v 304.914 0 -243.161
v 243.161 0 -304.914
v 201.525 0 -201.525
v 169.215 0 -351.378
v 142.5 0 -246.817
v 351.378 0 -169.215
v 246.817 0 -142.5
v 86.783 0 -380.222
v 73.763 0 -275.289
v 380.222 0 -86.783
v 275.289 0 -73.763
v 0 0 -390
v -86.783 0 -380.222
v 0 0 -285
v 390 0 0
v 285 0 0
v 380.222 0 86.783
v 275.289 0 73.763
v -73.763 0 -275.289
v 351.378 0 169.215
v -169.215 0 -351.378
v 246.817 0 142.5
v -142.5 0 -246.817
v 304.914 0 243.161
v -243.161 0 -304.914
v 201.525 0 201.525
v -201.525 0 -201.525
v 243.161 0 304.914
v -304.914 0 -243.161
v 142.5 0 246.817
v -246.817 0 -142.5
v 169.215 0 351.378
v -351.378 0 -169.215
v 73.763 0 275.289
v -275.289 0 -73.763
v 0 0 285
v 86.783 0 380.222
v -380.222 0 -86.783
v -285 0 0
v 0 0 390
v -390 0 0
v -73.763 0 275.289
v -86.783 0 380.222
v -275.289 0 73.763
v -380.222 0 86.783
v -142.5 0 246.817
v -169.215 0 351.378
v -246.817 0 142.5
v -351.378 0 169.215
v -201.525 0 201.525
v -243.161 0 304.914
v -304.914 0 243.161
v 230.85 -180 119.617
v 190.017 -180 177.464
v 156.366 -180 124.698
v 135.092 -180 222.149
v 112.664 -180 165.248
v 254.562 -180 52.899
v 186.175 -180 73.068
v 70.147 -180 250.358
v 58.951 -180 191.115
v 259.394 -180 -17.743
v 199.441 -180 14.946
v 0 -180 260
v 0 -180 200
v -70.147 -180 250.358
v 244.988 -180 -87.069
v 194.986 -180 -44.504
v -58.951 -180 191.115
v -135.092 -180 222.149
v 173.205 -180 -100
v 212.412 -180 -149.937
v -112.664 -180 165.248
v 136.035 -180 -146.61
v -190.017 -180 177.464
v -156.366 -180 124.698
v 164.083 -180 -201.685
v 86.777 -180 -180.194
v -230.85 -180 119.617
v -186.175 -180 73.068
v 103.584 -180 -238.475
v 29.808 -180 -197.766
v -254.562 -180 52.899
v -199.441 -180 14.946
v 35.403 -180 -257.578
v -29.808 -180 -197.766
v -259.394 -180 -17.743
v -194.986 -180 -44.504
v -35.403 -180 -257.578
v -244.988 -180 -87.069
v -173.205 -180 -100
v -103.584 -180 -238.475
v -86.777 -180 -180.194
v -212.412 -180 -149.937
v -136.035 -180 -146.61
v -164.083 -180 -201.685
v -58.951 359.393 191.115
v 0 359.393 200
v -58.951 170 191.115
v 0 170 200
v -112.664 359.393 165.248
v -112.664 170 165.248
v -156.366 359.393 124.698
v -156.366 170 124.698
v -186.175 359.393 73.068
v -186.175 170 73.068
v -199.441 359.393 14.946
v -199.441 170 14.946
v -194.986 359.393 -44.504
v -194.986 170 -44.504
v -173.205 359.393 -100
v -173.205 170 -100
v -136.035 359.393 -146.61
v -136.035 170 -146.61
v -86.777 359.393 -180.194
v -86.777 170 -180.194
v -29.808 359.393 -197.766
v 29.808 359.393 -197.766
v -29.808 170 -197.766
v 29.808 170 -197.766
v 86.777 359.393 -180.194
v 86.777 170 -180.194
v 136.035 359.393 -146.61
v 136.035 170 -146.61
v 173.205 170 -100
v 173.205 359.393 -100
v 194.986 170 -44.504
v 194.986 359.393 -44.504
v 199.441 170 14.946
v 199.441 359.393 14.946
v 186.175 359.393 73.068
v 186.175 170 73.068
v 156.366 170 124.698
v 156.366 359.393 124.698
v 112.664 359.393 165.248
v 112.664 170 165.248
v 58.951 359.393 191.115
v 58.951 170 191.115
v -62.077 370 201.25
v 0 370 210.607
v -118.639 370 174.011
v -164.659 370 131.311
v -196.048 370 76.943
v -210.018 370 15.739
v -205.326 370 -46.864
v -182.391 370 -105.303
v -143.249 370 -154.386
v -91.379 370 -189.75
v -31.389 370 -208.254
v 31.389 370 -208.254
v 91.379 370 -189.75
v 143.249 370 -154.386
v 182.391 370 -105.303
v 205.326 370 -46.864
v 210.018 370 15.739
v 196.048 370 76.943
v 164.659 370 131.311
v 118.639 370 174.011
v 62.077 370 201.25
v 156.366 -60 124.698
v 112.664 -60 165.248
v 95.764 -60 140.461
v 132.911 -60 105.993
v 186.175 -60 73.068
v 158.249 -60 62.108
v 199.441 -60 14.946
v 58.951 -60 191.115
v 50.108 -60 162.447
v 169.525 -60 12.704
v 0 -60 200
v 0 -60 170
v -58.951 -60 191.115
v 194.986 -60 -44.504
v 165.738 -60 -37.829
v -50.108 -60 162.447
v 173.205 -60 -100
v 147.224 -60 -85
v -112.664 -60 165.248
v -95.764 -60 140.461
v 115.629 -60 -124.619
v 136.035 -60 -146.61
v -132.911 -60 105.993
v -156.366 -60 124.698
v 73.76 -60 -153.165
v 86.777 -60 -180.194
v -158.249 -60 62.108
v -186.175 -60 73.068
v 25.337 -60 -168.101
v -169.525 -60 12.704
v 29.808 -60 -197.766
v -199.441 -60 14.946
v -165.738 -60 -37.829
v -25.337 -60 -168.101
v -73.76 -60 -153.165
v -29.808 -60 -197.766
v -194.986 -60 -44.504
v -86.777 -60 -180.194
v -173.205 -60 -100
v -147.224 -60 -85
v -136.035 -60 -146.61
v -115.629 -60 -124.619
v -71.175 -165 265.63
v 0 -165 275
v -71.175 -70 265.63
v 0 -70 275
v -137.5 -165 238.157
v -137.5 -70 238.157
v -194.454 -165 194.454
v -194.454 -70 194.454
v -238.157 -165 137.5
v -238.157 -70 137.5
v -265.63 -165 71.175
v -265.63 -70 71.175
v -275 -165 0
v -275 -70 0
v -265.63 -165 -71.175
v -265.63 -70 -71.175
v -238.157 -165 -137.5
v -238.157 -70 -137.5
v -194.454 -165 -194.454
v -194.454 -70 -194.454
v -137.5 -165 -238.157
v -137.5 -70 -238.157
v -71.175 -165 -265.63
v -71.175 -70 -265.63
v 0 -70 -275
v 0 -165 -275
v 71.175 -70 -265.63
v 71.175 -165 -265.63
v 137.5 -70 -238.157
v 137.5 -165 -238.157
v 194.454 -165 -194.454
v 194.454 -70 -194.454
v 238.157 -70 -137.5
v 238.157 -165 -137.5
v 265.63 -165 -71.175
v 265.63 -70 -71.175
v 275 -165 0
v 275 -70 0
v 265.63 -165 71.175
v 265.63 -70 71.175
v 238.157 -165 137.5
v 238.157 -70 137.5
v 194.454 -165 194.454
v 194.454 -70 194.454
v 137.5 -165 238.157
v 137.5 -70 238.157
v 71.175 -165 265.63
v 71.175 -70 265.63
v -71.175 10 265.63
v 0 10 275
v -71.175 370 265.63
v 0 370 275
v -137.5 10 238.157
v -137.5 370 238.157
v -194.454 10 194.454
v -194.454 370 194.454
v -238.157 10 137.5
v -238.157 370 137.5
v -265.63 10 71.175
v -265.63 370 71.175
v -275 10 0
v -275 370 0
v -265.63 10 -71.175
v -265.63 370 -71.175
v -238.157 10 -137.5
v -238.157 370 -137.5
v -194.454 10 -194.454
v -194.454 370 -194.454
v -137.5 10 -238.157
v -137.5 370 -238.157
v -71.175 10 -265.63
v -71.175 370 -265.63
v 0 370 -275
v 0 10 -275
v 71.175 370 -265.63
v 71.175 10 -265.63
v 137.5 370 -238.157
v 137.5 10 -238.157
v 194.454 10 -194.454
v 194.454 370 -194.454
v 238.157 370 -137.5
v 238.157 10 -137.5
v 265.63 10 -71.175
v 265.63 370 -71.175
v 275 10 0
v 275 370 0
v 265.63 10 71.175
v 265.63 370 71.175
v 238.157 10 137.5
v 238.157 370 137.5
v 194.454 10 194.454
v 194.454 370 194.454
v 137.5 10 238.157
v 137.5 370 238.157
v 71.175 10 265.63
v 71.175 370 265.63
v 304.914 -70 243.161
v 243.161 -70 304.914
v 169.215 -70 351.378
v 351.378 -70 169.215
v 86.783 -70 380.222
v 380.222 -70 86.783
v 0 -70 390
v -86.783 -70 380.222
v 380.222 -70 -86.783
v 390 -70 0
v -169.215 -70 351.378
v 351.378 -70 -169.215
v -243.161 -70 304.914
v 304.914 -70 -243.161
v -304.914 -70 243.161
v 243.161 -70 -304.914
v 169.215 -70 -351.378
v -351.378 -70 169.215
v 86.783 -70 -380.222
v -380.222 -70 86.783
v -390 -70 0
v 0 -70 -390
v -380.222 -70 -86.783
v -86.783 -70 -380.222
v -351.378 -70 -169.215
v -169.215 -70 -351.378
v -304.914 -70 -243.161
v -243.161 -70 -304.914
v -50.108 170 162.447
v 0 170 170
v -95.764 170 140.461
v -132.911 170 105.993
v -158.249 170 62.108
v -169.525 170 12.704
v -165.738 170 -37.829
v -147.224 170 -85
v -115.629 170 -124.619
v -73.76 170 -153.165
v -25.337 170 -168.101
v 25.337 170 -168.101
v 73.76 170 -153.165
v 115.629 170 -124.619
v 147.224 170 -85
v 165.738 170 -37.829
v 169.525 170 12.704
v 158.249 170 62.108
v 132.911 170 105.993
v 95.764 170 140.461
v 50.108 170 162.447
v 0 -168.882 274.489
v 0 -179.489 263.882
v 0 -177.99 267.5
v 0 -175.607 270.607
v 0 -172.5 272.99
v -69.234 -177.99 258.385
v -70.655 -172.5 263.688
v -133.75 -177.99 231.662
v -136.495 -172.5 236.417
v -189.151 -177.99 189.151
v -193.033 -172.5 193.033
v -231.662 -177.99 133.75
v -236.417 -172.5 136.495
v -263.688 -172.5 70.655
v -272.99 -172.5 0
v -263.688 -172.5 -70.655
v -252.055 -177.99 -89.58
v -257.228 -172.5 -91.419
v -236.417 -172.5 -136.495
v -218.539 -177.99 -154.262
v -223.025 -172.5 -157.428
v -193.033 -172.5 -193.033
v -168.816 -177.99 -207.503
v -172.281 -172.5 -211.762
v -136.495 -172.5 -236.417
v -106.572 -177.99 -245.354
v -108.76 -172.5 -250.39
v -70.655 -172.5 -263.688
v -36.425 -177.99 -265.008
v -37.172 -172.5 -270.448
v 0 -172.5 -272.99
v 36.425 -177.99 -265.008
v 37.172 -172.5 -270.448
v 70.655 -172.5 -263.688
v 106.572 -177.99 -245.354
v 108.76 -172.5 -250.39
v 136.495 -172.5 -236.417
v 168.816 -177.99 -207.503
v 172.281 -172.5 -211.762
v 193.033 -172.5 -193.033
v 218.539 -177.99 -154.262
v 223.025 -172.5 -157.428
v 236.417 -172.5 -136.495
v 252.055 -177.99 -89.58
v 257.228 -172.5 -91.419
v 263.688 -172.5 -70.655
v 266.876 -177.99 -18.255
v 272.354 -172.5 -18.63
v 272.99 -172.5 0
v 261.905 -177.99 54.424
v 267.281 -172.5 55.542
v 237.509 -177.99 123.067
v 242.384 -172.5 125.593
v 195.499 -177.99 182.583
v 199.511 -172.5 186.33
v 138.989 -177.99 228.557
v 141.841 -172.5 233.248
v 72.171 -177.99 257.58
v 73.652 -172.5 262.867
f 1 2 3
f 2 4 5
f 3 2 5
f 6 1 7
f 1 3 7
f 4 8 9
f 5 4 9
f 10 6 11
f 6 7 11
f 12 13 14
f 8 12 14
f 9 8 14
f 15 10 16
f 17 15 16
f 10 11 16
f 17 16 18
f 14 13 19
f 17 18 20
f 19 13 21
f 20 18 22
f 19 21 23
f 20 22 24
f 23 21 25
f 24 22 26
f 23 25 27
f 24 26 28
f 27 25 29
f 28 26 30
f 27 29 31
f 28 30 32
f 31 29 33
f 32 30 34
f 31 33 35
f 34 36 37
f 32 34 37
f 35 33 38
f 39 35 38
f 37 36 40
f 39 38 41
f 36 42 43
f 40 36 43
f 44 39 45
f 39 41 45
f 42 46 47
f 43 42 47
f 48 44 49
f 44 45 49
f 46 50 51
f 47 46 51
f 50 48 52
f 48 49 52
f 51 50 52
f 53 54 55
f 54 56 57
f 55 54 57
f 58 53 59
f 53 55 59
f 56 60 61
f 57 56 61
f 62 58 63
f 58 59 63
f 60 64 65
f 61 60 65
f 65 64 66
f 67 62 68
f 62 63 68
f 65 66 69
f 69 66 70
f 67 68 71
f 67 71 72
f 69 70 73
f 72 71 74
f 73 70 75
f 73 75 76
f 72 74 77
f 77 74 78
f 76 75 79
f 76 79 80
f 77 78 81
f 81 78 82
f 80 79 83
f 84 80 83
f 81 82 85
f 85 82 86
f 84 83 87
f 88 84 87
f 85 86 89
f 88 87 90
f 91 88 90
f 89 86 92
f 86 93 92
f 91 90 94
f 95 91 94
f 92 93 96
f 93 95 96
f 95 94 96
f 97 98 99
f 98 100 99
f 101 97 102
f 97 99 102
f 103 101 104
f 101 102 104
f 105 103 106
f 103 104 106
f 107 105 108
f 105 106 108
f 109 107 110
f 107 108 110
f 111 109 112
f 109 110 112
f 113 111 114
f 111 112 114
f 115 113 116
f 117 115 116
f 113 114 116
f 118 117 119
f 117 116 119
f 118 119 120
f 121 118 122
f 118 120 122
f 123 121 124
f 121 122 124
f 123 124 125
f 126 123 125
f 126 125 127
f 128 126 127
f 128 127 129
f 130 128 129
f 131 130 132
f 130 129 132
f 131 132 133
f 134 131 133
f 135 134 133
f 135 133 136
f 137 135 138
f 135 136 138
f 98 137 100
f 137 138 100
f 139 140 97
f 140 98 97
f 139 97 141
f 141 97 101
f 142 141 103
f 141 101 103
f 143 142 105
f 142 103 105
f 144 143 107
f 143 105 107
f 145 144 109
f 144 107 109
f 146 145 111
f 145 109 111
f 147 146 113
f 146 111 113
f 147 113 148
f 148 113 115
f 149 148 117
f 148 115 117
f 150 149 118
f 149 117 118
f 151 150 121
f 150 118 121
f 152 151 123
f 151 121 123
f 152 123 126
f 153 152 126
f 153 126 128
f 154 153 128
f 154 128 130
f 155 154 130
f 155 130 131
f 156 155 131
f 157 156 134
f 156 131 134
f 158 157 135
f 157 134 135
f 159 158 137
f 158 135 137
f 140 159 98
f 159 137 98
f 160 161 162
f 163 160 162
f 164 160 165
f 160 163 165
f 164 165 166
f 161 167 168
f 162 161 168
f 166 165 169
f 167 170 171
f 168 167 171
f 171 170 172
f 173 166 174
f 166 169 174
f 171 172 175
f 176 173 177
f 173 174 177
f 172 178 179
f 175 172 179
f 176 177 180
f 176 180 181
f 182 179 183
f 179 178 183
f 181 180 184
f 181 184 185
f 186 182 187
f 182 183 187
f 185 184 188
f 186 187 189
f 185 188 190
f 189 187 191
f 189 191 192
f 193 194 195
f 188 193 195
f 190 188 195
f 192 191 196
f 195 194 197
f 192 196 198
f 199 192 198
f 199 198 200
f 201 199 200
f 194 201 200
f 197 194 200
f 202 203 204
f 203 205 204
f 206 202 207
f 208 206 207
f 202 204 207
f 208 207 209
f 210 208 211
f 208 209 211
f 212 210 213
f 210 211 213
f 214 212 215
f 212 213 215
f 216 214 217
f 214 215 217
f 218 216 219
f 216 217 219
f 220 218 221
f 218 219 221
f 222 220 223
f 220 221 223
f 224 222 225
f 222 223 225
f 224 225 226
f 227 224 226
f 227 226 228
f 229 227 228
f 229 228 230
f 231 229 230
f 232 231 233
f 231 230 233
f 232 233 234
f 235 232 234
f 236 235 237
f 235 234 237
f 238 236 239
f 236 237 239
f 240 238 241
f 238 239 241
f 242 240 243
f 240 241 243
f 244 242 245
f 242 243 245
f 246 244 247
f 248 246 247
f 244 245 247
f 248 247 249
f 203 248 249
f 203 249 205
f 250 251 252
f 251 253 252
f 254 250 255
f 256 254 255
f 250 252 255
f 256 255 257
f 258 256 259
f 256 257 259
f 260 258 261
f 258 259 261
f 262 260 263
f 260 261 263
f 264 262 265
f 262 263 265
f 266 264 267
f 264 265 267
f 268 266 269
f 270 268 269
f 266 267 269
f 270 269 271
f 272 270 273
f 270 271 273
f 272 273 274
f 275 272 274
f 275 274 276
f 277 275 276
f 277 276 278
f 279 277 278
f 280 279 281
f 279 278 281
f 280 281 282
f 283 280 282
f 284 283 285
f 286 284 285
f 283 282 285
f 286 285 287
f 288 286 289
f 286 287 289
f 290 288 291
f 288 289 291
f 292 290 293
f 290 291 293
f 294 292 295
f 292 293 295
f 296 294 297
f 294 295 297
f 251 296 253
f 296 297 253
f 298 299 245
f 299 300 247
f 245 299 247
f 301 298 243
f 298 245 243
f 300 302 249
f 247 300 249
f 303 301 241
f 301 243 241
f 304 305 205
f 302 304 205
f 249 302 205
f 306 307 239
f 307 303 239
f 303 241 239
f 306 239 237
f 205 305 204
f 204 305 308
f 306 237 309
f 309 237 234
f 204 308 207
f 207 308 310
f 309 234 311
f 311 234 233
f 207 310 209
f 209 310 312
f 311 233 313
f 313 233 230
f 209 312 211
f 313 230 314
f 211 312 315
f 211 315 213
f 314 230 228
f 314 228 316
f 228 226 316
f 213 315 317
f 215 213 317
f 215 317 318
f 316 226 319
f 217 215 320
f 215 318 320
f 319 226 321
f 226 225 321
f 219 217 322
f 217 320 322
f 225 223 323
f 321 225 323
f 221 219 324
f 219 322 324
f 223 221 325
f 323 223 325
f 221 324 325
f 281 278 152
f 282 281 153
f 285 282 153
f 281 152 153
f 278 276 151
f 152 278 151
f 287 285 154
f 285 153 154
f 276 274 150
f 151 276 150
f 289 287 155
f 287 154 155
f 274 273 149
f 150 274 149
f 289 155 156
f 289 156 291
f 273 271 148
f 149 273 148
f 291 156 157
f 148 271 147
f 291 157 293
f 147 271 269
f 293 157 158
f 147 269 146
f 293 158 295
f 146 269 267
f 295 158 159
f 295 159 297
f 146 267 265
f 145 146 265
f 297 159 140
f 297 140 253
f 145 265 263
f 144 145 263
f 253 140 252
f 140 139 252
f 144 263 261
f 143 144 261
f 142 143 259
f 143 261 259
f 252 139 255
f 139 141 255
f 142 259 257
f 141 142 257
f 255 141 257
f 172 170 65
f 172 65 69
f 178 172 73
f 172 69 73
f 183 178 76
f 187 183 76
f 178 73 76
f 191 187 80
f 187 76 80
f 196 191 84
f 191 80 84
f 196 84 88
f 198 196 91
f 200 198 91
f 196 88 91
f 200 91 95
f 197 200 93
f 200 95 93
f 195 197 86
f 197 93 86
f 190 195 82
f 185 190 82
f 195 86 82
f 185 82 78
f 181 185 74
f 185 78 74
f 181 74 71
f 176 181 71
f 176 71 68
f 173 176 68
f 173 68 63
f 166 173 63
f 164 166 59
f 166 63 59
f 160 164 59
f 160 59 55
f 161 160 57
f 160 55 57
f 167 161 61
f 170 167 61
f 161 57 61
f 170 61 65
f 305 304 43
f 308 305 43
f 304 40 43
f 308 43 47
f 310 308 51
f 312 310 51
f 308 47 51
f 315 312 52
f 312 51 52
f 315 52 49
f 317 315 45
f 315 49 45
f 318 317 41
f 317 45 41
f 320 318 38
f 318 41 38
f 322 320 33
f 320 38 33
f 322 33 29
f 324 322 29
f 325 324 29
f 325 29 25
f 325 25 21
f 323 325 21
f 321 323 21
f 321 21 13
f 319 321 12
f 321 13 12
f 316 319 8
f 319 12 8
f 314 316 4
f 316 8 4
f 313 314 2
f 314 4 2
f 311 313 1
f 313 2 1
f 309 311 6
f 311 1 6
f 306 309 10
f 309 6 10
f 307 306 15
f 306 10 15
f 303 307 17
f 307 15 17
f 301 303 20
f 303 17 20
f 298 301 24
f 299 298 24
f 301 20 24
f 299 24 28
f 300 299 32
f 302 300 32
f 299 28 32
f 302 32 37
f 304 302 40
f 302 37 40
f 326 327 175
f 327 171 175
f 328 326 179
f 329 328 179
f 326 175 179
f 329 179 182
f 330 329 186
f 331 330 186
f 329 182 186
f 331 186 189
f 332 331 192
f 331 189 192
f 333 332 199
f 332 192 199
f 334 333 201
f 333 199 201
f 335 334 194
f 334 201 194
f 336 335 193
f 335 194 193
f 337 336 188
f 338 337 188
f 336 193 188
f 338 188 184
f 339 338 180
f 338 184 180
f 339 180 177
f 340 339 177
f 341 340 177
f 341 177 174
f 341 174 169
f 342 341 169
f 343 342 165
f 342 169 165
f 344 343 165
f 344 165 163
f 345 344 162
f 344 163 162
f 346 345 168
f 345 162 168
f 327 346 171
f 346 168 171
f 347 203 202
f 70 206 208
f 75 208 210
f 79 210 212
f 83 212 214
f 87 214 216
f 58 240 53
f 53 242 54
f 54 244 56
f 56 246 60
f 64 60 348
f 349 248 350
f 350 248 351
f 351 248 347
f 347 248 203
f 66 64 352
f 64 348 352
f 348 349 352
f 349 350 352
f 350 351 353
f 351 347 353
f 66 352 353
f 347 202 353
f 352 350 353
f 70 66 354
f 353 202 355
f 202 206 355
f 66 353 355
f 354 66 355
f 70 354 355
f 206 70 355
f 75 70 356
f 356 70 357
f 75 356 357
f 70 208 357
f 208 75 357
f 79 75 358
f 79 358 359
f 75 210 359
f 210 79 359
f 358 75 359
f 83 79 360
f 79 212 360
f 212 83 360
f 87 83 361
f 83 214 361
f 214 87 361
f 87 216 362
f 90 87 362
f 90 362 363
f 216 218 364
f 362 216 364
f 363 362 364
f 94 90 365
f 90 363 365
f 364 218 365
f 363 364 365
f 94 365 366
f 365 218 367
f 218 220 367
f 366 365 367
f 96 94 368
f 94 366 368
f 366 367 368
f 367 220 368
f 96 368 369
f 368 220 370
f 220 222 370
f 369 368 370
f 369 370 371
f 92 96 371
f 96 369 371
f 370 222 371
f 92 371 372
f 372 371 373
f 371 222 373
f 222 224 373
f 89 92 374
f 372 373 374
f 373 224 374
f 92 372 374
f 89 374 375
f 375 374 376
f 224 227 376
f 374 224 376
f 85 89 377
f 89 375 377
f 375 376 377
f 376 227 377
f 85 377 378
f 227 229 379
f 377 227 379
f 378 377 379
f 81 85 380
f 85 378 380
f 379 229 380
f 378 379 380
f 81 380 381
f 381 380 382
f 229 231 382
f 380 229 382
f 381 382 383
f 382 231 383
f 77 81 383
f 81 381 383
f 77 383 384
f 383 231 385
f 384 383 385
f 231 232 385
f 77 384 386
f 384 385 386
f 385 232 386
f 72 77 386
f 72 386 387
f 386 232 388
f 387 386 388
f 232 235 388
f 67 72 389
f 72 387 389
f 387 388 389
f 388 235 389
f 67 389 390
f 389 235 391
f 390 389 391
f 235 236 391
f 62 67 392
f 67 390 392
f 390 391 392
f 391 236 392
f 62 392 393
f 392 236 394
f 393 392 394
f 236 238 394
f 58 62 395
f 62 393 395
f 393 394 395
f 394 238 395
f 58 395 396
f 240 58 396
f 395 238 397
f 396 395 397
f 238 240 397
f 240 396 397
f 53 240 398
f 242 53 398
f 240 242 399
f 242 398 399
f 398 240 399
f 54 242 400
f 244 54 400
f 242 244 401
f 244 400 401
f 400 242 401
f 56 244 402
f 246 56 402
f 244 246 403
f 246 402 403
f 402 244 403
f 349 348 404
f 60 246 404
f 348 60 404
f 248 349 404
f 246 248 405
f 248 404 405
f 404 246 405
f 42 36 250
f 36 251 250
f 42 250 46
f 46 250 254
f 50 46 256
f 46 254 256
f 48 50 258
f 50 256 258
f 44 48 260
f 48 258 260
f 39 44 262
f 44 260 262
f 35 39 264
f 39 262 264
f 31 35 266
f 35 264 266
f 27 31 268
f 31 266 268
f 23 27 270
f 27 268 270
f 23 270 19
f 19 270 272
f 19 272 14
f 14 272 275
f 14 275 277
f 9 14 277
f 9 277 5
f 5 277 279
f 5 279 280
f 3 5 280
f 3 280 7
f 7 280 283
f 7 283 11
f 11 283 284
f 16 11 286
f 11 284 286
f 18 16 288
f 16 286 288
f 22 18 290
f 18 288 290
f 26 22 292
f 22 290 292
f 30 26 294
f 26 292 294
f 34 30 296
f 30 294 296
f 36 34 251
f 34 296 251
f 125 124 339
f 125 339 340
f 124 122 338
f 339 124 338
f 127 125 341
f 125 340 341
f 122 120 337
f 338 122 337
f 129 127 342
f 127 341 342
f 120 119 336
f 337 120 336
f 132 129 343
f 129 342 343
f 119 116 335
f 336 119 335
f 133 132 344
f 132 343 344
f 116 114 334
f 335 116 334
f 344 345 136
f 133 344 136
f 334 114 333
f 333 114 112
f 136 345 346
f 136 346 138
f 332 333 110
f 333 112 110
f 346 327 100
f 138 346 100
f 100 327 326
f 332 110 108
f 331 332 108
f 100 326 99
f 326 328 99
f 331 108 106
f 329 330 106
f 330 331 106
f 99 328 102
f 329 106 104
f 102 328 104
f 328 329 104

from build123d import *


with BuildPart() as part:
    # Esquisse1 → Révolution1 (revolve)
    with BuildSketch(Plane.XY, mode=Mode.PRIVATE) as r_volution1_sk:
        with BuildLine():
            Line((200, -60), (200, -180))
            Line((200, -180), (260, -180))
            ThreePointArc((260, -180), (270.606601718, -175.606601718), (275, -165))
            Line((275, -165), (275, -70))
            Line((275, -70), (390, -70))
            Line((390, -70), (390, 0))
            Line((390, 0), (285, 0))
            Line((285, 0), (275, 10))
            Line((275, 10), (275, 370))
            Line((275, 370), (210.606601718, 370))
            Line((210.606601718, 370), (200, 359.393398282))
            Line((200, 359.393398282), (200, 170))
            Line((200, 170), (170, 170))
            Line((170, 170), (170, -60))
            Line((170, -60), (200, -60))
        make_face()
    revolve(r_volution1_sk.sketch.rotate(Axis((0, 425.243902439, 0), (0, -1, 0)), 90), axis=Axis((0, 425.243902439, 0), (0, -1, 0)))


solid = part.part
